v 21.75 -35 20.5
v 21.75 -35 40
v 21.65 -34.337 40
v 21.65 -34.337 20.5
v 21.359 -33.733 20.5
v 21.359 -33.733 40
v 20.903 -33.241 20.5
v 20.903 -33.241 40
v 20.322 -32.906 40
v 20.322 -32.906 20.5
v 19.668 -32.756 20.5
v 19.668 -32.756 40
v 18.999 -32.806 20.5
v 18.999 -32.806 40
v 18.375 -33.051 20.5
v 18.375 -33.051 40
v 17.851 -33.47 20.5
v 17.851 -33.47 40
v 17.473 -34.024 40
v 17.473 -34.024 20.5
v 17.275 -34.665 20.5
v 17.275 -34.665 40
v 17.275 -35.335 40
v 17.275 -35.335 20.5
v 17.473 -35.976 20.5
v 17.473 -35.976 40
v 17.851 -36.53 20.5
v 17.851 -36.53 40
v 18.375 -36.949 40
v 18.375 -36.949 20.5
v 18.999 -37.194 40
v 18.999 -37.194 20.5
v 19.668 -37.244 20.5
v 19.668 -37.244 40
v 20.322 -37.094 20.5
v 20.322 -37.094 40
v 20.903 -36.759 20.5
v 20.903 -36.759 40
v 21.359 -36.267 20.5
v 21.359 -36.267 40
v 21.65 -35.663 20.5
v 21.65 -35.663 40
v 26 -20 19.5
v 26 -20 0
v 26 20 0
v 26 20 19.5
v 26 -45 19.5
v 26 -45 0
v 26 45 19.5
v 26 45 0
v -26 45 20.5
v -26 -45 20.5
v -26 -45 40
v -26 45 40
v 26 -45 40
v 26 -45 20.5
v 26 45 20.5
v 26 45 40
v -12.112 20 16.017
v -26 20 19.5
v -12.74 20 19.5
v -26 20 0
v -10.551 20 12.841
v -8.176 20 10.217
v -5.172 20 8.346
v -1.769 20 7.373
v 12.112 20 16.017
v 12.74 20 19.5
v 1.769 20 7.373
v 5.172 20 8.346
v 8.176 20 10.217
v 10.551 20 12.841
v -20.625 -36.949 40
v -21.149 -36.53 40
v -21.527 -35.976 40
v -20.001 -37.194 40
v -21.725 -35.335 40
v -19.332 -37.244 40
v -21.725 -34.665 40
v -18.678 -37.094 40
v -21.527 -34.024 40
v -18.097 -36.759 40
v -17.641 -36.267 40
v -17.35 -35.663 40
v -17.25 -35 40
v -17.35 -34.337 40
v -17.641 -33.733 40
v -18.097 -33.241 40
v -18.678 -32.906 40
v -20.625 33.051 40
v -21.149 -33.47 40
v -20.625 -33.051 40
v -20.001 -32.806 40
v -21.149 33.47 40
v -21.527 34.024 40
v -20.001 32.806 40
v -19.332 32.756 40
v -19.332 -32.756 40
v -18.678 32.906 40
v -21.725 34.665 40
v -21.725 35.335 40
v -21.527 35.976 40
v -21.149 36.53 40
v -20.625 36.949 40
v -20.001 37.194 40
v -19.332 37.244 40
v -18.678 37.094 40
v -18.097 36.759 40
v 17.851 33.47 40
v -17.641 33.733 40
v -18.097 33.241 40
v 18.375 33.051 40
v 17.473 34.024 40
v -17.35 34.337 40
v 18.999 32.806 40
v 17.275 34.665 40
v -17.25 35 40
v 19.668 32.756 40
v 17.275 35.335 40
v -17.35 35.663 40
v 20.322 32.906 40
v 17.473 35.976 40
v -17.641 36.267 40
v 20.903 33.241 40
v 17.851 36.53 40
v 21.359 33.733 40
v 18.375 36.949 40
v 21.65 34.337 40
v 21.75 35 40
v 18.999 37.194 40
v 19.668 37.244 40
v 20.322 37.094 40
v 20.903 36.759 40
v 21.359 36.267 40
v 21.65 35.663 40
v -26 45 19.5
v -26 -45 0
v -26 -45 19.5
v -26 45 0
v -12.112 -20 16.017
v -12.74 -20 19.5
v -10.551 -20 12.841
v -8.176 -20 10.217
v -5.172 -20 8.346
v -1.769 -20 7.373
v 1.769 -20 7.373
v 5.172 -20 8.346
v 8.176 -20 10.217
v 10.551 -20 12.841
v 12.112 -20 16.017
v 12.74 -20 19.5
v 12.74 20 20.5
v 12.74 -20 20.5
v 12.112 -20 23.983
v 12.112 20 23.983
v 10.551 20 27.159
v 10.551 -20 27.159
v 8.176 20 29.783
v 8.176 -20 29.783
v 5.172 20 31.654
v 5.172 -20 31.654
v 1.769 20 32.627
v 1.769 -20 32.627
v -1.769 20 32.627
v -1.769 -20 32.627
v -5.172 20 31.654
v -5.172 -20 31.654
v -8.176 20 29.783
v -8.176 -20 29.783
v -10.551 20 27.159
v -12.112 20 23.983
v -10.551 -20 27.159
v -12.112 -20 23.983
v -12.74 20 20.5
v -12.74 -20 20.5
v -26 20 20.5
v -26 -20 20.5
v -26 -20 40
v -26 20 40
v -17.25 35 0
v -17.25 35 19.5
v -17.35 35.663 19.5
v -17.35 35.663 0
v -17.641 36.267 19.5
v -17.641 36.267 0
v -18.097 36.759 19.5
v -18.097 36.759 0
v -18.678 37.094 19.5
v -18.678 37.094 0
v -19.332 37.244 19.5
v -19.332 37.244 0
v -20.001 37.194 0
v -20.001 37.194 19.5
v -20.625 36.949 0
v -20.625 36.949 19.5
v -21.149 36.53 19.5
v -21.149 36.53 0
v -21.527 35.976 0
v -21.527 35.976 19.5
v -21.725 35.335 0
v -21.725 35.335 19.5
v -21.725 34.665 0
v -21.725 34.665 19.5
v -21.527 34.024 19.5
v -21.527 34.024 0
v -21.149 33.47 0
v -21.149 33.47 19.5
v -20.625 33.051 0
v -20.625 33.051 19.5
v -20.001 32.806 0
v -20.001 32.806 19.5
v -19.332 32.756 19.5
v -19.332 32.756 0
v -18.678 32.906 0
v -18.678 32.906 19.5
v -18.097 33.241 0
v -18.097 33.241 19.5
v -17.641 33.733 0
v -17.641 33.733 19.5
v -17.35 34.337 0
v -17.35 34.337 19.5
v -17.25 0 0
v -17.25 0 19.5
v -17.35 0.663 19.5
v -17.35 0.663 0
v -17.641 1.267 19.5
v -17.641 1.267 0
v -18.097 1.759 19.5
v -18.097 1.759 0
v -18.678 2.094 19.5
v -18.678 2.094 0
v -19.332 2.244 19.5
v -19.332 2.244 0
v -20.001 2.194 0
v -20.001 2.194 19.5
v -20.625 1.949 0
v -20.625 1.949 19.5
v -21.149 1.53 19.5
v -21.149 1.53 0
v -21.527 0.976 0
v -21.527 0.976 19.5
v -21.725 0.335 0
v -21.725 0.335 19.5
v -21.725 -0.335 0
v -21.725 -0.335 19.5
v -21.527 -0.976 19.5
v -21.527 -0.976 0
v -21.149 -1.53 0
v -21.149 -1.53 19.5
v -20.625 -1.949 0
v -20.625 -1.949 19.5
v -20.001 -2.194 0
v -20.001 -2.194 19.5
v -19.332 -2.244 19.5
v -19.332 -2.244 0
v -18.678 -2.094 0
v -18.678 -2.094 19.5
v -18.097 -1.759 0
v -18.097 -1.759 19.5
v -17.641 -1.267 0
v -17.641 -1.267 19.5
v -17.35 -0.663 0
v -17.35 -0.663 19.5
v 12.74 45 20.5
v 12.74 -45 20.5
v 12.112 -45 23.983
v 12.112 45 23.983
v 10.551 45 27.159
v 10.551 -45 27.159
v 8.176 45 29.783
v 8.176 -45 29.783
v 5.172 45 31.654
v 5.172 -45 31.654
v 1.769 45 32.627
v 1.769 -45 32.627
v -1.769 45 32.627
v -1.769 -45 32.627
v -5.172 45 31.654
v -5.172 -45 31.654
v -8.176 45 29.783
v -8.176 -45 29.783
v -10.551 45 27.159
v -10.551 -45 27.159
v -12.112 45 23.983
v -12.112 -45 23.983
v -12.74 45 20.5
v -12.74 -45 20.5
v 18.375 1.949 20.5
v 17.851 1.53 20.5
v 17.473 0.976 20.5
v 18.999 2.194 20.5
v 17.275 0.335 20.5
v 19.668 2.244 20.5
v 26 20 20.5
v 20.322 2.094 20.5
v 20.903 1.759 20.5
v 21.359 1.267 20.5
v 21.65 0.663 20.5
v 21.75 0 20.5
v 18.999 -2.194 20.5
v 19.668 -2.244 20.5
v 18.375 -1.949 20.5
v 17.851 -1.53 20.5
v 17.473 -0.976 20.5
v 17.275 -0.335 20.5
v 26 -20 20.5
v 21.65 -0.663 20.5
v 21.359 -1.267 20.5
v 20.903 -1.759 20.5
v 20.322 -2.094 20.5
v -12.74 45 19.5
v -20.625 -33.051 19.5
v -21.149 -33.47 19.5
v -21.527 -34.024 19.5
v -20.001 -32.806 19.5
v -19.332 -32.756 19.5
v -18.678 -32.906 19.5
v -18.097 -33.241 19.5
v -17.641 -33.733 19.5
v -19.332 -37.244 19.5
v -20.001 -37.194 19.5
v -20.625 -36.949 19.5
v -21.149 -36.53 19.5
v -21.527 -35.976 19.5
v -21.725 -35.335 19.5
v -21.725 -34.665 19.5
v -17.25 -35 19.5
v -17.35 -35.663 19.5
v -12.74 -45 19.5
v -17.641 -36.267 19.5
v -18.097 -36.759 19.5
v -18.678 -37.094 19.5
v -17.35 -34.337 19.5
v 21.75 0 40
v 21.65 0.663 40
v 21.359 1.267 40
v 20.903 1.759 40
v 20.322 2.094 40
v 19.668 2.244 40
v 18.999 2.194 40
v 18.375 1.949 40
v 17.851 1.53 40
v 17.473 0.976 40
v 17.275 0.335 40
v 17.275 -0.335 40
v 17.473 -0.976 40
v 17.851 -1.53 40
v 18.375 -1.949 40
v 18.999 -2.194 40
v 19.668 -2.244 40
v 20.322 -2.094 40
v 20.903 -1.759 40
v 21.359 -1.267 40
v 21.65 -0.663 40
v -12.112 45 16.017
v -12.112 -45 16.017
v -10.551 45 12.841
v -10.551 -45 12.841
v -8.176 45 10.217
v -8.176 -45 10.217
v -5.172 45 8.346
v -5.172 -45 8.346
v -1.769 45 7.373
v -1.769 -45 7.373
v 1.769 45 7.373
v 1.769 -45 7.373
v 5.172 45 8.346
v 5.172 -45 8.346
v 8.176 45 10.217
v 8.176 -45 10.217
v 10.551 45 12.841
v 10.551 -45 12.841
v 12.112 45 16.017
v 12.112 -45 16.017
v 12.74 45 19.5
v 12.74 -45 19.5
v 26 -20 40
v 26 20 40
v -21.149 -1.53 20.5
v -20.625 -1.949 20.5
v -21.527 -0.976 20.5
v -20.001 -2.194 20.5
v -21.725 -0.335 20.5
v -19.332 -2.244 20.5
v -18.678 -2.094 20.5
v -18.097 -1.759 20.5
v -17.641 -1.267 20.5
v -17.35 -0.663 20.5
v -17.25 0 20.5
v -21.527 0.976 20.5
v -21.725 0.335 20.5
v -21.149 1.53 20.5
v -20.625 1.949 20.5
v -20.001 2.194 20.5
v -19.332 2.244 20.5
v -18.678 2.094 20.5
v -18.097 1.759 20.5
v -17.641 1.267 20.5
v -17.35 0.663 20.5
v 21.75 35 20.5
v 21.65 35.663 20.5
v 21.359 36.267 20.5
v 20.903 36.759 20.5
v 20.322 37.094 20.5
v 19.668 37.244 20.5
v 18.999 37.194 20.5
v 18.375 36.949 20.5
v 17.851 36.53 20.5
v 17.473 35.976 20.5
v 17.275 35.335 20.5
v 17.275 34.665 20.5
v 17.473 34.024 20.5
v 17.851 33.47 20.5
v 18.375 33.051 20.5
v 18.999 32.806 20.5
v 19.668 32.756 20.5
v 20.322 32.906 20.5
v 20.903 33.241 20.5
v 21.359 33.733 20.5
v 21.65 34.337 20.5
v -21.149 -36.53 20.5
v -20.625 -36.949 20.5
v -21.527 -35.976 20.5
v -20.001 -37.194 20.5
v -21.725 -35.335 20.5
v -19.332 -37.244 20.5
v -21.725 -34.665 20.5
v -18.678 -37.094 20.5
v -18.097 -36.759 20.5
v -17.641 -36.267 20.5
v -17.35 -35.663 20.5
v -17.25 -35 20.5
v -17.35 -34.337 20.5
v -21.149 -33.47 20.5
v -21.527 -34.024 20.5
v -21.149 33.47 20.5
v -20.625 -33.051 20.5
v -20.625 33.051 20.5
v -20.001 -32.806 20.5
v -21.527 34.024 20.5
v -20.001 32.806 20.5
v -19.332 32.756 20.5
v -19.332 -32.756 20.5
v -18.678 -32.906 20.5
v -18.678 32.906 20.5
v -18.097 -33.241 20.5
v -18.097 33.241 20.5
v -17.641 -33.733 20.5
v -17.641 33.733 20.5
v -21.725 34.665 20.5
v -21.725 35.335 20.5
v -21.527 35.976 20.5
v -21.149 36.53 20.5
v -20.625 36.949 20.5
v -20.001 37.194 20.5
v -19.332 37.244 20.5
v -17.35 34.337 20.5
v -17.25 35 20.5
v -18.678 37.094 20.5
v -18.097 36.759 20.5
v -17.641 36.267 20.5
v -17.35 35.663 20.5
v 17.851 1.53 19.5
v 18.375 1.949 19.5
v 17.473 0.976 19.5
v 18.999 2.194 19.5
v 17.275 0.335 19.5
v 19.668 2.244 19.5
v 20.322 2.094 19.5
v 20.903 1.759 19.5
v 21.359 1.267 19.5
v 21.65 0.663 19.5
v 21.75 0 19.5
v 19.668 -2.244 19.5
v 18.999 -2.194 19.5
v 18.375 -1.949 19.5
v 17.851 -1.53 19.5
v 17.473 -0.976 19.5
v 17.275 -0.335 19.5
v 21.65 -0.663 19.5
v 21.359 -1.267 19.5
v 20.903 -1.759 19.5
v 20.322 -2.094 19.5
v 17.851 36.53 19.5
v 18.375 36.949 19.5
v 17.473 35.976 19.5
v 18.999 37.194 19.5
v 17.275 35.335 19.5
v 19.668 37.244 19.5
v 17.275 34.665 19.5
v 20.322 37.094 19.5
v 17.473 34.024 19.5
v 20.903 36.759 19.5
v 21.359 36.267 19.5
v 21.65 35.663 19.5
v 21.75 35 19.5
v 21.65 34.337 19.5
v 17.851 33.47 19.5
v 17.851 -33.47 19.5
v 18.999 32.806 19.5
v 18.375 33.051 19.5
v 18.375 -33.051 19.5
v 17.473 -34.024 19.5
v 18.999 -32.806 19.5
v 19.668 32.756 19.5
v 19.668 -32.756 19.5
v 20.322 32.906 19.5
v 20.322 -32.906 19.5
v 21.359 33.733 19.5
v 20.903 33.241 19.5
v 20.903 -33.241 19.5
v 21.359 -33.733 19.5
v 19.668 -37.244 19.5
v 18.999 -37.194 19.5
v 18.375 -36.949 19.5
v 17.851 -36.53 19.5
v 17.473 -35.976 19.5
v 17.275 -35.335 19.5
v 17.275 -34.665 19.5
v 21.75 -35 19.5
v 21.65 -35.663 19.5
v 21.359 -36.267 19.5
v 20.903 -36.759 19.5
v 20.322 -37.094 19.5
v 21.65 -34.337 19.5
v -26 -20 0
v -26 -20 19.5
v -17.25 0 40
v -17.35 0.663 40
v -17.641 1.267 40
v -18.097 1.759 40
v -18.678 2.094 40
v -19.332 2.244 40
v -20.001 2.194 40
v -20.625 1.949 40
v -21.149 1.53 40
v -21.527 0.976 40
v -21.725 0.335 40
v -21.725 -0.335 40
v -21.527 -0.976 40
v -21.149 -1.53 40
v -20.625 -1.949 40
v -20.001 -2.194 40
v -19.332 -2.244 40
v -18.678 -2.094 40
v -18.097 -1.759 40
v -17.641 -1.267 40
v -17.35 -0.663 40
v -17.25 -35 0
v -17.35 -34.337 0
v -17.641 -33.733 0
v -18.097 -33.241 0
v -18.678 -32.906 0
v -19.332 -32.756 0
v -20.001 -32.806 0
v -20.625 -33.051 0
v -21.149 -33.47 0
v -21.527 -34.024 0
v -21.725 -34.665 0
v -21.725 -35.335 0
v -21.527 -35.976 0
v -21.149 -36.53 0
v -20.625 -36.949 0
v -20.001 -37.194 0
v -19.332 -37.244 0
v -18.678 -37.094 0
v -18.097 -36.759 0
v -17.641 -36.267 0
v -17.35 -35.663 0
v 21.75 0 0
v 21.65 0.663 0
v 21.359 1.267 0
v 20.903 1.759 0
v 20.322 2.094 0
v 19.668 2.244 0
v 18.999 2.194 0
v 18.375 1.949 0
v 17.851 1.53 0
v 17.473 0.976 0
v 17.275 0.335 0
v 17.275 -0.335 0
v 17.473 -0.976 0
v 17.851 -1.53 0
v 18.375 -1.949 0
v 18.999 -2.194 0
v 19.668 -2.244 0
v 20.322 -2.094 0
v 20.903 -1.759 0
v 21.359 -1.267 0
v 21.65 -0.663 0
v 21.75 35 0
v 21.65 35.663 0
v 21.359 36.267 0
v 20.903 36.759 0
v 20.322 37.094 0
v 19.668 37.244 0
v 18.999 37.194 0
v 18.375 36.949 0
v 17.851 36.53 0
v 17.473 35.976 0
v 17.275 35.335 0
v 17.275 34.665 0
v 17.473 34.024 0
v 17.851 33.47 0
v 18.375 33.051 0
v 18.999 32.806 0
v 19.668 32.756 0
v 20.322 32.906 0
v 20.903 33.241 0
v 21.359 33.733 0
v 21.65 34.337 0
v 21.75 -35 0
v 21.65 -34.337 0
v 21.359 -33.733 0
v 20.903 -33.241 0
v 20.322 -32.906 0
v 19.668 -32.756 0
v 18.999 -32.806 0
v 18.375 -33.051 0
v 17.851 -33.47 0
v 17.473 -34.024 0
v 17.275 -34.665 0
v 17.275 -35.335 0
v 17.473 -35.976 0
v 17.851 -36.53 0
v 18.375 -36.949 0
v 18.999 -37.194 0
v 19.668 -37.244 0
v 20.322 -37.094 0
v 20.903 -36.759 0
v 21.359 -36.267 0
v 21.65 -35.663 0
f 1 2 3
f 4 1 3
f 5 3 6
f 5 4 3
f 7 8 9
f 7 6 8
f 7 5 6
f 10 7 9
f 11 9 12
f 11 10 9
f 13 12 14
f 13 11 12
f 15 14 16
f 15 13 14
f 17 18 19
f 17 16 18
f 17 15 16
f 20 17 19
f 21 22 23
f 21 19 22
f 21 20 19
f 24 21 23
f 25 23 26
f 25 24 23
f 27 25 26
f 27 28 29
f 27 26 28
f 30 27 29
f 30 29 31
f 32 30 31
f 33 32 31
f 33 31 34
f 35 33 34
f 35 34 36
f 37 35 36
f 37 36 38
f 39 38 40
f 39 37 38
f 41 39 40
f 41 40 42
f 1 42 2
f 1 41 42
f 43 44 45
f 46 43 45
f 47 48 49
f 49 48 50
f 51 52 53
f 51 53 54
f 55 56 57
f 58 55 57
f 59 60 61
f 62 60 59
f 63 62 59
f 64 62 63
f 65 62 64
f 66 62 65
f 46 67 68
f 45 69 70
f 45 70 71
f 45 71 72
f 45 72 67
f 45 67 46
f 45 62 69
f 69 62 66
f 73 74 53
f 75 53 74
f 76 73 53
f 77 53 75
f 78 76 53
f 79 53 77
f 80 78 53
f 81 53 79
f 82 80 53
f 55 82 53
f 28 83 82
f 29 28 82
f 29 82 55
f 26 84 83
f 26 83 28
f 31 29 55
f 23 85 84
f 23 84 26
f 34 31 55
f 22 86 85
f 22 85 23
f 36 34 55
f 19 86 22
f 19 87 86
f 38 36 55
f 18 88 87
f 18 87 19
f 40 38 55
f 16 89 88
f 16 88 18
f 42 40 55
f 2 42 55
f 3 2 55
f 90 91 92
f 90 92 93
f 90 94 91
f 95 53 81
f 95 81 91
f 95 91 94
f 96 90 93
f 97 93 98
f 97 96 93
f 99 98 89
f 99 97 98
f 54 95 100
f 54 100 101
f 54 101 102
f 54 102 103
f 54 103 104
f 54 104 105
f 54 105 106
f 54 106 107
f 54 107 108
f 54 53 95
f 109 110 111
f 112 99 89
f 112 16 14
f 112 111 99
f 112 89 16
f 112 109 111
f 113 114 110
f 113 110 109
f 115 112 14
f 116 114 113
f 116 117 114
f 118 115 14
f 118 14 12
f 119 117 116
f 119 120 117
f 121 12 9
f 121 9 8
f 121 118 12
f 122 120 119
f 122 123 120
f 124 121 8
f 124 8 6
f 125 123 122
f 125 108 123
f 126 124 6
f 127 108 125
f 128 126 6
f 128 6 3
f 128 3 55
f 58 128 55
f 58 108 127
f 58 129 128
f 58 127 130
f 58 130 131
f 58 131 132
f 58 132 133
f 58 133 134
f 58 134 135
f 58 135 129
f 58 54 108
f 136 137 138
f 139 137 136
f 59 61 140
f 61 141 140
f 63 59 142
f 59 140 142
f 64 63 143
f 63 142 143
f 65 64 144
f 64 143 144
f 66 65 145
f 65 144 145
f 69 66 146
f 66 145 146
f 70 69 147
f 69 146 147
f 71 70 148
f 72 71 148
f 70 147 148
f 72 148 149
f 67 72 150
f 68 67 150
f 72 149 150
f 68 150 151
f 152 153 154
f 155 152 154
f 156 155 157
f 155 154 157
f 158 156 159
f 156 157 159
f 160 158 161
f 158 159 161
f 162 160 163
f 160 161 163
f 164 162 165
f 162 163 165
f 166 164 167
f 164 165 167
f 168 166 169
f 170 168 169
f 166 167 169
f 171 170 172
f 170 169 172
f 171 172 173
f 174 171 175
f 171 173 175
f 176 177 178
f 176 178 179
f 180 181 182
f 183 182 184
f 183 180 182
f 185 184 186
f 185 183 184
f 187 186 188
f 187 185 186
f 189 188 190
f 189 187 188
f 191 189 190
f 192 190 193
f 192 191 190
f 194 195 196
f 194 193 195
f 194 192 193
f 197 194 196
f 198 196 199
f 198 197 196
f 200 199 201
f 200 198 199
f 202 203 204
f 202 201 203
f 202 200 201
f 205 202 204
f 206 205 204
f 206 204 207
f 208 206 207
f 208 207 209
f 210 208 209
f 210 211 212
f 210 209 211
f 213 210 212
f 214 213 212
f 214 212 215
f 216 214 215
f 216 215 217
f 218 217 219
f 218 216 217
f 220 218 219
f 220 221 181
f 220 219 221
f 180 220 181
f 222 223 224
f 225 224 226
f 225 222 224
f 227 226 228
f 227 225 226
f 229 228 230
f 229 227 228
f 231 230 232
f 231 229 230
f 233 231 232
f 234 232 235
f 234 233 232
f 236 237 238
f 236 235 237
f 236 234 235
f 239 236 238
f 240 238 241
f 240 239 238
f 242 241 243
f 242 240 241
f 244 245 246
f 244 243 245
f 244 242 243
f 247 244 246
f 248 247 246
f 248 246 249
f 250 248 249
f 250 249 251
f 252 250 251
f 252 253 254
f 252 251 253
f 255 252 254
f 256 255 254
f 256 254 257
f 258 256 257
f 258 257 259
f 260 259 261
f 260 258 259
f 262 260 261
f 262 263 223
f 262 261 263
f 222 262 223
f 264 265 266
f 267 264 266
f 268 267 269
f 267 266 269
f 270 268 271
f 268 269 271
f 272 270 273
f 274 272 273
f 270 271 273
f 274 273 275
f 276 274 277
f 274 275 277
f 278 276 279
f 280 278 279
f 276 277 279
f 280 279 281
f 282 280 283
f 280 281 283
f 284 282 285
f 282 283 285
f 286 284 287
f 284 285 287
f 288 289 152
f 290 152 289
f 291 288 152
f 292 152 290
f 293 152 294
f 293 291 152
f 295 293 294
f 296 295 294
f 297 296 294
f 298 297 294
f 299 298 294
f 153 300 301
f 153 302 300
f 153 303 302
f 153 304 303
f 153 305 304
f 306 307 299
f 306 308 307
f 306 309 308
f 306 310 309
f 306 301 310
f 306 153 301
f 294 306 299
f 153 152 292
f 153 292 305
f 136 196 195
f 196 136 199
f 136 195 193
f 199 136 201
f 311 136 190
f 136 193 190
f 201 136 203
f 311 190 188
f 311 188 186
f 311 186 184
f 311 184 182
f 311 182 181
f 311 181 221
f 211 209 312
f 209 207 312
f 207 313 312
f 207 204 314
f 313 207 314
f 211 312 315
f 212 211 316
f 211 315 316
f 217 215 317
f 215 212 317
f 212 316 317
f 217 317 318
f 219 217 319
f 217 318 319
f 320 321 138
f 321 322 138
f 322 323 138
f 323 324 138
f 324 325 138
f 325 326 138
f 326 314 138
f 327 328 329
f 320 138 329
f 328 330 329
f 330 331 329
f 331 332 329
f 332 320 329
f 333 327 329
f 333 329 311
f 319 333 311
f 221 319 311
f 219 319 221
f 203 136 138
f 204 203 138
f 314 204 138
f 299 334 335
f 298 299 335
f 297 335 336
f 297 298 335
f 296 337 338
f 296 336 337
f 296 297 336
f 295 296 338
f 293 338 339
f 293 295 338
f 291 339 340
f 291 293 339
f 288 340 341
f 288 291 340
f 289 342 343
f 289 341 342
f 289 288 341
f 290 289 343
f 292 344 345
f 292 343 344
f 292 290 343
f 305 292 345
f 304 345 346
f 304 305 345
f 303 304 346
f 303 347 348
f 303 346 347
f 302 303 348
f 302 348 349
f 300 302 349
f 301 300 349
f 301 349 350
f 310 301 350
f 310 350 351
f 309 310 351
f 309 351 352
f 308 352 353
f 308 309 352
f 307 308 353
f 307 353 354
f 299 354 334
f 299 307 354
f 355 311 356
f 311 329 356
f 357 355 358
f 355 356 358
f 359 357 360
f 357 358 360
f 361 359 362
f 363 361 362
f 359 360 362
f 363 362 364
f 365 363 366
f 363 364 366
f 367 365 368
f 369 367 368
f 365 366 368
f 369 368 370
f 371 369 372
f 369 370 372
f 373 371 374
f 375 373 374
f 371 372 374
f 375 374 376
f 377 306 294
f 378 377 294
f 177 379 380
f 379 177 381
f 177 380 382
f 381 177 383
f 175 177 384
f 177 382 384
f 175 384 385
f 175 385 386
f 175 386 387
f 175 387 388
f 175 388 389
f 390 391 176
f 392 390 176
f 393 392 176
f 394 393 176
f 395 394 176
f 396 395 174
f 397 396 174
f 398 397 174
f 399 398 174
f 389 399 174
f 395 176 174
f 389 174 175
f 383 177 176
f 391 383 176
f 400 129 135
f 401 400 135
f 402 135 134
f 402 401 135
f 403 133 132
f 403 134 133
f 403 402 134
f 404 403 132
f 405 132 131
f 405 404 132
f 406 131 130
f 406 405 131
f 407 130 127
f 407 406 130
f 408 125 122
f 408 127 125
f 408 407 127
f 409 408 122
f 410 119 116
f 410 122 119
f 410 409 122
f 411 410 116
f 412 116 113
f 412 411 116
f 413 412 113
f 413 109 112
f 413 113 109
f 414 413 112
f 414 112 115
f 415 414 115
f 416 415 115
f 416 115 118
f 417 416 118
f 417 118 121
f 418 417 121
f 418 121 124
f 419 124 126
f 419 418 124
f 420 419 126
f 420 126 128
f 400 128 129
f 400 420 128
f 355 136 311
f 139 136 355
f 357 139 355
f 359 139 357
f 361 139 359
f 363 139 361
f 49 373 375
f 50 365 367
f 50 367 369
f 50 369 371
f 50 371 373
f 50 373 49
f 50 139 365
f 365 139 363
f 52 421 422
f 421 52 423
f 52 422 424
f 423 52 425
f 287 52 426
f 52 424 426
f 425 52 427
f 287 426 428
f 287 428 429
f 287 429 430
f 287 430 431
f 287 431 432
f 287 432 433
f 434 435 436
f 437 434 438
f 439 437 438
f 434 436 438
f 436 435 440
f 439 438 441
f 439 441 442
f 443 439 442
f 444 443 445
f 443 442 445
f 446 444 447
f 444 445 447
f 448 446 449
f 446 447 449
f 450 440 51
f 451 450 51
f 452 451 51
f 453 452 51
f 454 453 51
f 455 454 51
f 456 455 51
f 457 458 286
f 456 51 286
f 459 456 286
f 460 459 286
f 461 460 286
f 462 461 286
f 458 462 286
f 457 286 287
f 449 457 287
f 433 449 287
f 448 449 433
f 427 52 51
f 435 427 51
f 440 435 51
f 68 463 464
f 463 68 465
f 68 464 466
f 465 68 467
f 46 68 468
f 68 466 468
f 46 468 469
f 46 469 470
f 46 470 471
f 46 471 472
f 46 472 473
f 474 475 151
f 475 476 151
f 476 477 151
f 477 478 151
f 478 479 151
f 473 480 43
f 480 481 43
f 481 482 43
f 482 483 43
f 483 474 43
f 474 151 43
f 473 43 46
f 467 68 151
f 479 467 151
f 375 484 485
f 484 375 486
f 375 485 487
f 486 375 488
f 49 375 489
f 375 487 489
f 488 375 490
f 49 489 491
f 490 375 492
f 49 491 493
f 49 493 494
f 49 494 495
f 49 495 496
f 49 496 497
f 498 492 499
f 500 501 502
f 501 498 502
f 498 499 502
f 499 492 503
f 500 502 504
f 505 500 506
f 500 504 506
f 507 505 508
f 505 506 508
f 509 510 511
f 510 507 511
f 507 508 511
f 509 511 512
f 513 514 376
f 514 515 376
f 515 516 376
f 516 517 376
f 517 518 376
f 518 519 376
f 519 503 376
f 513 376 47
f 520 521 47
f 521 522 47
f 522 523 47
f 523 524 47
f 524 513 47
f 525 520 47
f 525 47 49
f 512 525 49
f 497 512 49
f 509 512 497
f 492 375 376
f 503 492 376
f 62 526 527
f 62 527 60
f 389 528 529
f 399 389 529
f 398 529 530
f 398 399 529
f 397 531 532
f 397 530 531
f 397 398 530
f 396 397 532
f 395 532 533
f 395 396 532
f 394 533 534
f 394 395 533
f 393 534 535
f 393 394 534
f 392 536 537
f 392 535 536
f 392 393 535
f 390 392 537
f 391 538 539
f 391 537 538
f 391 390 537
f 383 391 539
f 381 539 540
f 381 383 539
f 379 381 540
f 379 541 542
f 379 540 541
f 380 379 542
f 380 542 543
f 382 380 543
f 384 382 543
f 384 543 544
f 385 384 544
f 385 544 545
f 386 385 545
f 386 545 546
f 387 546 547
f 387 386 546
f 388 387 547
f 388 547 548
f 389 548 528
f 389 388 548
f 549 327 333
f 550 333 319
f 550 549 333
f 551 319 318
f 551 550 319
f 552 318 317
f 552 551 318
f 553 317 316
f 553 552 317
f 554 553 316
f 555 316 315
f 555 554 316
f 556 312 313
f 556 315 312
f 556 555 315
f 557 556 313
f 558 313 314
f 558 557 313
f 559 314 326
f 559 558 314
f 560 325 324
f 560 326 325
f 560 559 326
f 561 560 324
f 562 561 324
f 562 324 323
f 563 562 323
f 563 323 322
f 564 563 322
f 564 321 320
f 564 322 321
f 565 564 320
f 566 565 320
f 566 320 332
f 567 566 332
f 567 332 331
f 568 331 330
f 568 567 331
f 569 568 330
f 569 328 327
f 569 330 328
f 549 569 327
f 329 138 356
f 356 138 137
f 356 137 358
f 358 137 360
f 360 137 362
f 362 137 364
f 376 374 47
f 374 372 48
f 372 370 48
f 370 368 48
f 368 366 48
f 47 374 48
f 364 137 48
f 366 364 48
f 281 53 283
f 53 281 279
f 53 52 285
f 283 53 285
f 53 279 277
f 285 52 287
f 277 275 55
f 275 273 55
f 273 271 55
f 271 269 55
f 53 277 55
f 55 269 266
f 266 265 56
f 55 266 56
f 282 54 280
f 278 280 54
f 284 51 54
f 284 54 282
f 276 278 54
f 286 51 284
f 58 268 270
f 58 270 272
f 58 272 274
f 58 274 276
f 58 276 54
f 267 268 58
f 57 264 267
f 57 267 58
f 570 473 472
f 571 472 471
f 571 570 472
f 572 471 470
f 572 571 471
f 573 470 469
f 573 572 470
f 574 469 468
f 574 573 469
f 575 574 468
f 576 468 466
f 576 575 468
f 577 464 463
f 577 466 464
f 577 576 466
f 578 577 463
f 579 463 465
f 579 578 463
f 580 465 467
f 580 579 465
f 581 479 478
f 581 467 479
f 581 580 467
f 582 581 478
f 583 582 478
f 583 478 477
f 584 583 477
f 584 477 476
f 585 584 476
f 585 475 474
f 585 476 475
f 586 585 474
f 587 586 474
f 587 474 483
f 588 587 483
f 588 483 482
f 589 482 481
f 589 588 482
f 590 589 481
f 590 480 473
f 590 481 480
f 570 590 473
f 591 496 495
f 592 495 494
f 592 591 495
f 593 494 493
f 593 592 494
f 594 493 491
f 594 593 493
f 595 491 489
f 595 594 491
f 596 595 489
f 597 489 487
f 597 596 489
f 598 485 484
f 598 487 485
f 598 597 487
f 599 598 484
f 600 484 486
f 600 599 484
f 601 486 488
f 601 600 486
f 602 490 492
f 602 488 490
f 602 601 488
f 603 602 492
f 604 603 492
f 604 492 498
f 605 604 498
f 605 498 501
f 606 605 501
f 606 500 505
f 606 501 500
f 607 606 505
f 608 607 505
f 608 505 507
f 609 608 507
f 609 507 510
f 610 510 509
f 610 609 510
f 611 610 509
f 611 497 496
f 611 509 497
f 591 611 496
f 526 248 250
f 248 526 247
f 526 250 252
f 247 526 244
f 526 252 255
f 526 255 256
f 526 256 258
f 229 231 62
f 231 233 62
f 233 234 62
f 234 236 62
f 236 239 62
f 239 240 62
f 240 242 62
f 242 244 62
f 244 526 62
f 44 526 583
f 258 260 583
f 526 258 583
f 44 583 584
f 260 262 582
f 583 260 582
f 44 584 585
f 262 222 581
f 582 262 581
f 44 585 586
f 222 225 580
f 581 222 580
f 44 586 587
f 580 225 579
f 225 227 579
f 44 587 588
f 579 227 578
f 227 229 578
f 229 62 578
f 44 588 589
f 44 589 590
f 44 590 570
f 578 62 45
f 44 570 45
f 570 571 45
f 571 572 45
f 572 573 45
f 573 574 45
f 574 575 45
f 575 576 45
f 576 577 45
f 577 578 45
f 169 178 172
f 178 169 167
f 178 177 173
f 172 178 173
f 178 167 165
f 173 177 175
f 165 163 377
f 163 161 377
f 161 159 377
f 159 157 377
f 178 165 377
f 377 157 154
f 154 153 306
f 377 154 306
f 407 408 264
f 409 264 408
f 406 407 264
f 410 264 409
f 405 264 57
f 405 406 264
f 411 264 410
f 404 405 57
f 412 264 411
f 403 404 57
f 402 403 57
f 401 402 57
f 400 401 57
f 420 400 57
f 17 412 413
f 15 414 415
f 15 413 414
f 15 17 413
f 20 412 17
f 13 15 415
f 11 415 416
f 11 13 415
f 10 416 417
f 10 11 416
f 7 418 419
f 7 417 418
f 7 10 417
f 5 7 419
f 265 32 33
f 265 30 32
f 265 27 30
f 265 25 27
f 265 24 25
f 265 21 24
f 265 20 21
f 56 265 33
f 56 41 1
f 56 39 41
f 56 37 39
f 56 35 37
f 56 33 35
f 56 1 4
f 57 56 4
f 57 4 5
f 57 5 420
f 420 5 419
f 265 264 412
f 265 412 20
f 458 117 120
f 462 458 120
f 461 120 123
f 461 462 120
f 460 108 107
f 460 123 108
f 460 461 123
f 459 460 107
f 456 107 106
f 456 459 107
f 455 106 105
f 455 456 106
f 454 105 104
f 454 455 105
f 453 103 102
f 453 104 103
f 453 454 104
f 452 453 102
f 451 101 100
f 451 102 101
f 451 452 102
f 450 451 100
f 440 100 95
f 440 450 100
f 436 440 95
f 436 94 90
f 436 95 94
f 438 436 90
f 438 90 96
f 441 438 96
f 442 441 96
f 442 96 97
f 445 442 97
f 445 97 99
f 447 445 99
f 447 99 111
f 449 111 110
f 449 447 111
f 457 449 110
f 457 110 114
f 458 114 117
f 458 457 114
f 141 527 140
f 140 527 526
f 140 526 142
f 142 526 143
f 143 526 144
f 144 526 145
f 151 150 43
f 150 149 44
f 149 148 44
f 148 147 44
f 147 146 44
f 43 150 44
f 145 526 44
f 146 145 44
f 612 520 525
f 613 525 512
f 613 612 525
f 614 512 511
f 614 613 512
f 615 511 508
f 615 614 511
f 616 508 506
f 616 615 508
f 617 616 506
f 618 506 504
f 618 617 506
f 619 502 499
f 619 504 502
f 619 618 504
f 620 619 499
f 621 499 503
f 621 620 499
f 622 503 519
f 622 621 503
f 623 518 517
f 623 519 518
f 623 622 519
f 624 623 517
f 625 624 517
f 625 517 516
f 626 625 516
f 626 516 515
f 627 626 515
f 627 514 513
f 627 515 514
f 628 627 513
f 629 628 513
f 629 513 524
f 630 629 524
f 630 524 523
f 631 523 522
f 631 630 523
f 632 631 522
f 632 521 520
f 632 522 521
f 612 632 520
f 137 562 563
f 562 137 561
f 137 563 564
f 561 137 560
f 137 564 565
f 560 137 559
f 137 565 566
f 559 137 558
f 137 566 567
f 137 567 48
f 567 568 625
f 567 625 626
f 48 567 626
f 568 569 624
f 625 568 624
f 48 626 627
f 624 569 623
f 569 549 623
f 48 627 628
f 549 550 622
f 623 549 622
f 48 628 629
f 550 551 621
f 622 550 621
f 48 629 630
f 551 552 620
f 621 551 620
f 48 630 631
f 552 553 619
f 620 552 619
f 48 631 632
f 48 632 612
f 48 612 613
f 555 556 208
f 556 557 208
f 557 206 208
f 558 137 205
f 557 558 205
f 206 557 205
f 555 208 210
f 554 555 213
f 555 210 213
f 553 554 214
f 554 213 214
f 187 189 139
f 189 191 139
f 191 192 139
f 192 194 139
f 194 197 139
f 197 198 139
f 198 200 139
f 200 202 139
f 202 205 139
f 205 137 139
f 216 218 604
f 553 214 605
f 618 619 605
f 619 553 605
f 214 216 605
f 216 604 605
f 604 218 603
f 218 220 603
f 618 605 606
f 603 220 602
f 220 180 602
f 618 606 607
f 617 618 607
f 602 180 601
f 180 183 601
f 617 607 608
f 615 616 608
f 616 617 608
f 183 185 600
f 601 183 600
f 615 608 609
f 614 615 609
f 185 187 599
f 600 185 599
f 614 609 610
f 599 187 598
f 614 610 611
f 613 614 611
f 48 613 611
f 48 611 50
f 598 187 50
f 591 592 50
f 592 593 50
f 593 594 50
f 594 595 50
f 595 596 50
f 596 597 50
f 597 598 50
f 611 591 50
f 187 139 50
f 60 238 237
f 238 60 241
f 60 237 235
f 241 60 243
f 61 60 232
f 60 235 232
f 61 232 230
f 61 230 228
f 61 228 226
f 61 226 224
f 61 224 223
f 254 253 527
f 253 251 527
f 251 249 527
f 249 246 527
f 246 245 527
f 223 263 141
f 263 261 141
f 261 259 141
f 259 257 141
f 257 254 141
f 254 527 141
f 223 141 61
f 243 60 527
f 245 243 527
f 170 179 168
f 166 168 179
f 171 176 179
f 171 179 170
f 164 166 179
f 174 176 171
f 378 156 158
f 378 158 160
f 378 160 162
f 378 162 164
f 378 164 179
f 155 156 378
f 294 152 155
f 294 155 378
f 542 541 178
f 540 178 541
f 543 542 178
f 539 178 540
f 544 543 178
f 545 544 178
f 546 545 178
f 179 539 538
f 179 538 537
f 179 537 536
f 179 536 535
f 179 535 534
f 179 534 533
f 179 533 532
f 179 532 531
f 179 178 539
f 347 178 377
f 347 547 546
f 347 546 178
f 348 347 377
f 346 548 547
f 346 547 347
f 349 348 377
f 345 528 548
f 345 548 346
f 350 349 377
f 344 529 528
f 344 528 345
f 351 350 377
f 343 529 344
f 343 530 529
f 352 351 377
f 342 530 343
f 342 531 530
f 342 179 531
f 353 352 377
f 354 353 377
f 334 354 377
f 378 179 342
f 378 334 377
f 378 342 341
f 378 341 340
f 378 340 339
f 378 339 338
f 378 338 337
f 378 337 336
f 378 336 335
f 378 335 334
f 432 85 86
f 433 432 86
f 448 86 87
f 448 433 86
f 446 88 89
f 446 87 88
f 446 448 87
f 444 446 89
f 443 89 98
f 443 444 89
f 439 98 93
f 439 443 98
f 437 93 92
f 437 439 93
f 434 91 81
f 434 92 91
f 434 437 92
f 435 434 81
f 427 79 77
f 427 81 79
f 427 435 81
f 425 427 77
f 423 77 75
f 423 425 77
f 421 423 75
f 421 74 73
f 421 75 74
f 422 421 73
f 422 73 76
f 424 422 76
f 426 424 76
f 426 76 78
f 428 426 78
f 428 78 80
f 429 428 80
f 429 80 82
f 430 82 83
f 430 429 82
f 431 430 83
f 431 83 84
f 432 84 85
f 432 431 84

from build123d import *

# Parameters (mm, degrees)
SKETCH_W             = 52
SKETCH_H             = 90
PAD_DEPTH            = 40
SKETCH001_R          = 12.75
POCKET_DEPTH         = 45.001
POCKET_DEPTH_BACK    = -45.001
SKETCH002_W          = 60
SKETCH002_H          = 1
POCKET001_DEPTH      = 45.001
POCKET001_DEPTH_BACK = -45.001
SKETCH003_R          = 2.25
POCKET002_DEPTH      = 0.001
POCKET002_DEPTH_BACK = -40.001
SKETCH004_W          = 52
SKETCH004_H          = 40
PAD001_DEPTH         = 40
SKETCH005_R          = 12.75
POCKET003_DEPTH      = 20.001
POCKET003_DEPTH_BACK = -20.001
SKETCH006_W          = 60
SKETCH006_H          = 1
POCKET004_DEPTH      = 20.001
POCKET004_DEPTH_BACK = -20.001
SKETCH007_R          = 2.25
POCKET005_DEPTH      = 0.001
POCKET005_DEPTH_BACK = -40.001


with BuildPart() as body:
    # Sketch → Pad (new body)
    with BuildSketch(Plane.XY):
        Rectangle(SKETCH_W, SKETCH_H)
    extrude(amount=PAD_DEPTH)

    # Sketch001 → Pocket (cut, two sides)
    with BuildSketch(Plane.XZ) as pocket_sk:
        with Locations((0, 20)):
            Circle(SKETCH001_R)
    extrude(amount=-POCKET_DEPTH, mode=Mode.SUBTRACT)
    extrude(pocket_sk.sketch, amount=-POCKET_DEPTH_BACK, mode=Mode.SUBTRACT)

    # Sketch002 → Pocket001 (cut, two sides)
    with BuildSketch(Plane.XZ) as pocket001_sk:
        with Locations((0, 20)):
            Rectangle(SKETCH002_W, SKETCH002_H)
    extrude(amount=-POCKET001_DEPTH, mode=Mode.SUBTRACT)
    extrude(pocket001_sk.sketch, amount=-POCKET001_DEPTH_BACK, mode=Mode.SUBTRACT)

    # Sketch003 → Pocket002 (cut, two sides)
    with BuildSketch(Plane.XY) as pocket002_sk:
        with Locations((-19.5, 35)):
            Circle(SKETCH003_R)
        with Locations((19.5, 35)):
            Circle(SKETCH003_R)
        with Locations((19.5, -35)):
            Circle(SKETCH003_R)
        with Locations((-19.5, -35)):
            Circle(SKETCH003_R)
    extrude(amount=-POCKET002_DEPTH, mode=Mode.SUBTRACT)
    extrude(pocket002_sk.sketch, amount=-POCKET002_DEPTH_BACK, mode=Mode.SUBTRACT)


with BuildPart() as body001:
    # Sketch004 → Pad001 (new body)
    with BuildSketch(Plane.XY):
        Rectangle(SKETCH004_W, SKETCH004_H)
    extrude(amount=PAD001_DEPTH)

    # Sketch005 → Pocket003 (cut, two sides)
    with BuildSketch(Plane.XZ) as pocket003_sk:
        with Locations((0, 20)):
            Circle(SKETCH005_R)
    extrude(amount=-POCKET003_DEPTH, mode=Mode.SUBTRACT)
    extrude(pocket003_sk.sketch, amount=-POCKET003_DEPTH_BACK, mode=Mode.SUBTRACT)

    # Sketch006 → Pocket004 (cut, two sides)
    with BuildSketch(Plane.XZ) as pocket004_sk:
        with Locations((0, 20)):
            Rectangle(SKETCH006_W, SKETCH006_H)
    extrude(amount=-POCKET004_DEPTH, mode=Mode.SUBTRACT)
    extrude(pocket004_sk.sketch, amount=-POCKET004_DEPTH_BACK, mode=Mode.SUBTRACT)

    # Sketch007 → Pocket005 (cut, two sides)
    with BuildSketch(Plane.XY) as pocket005_sk:
        with Locations((-19.5, 0)):
            Circle(SKETCH007_R)
        with Locations((19.5, 0)):
            Circle(SKETCH007_R)
    extrude(amount=-POCKET005_DEPTH, mode=Mode.SUBTRACT)
    extrude(pocket005_sk.sketch, amount=-POCKET005_DEPTH_BACK, mode=Mode.SUBTRACT)


solid = Compound([body.part, body001.part])
